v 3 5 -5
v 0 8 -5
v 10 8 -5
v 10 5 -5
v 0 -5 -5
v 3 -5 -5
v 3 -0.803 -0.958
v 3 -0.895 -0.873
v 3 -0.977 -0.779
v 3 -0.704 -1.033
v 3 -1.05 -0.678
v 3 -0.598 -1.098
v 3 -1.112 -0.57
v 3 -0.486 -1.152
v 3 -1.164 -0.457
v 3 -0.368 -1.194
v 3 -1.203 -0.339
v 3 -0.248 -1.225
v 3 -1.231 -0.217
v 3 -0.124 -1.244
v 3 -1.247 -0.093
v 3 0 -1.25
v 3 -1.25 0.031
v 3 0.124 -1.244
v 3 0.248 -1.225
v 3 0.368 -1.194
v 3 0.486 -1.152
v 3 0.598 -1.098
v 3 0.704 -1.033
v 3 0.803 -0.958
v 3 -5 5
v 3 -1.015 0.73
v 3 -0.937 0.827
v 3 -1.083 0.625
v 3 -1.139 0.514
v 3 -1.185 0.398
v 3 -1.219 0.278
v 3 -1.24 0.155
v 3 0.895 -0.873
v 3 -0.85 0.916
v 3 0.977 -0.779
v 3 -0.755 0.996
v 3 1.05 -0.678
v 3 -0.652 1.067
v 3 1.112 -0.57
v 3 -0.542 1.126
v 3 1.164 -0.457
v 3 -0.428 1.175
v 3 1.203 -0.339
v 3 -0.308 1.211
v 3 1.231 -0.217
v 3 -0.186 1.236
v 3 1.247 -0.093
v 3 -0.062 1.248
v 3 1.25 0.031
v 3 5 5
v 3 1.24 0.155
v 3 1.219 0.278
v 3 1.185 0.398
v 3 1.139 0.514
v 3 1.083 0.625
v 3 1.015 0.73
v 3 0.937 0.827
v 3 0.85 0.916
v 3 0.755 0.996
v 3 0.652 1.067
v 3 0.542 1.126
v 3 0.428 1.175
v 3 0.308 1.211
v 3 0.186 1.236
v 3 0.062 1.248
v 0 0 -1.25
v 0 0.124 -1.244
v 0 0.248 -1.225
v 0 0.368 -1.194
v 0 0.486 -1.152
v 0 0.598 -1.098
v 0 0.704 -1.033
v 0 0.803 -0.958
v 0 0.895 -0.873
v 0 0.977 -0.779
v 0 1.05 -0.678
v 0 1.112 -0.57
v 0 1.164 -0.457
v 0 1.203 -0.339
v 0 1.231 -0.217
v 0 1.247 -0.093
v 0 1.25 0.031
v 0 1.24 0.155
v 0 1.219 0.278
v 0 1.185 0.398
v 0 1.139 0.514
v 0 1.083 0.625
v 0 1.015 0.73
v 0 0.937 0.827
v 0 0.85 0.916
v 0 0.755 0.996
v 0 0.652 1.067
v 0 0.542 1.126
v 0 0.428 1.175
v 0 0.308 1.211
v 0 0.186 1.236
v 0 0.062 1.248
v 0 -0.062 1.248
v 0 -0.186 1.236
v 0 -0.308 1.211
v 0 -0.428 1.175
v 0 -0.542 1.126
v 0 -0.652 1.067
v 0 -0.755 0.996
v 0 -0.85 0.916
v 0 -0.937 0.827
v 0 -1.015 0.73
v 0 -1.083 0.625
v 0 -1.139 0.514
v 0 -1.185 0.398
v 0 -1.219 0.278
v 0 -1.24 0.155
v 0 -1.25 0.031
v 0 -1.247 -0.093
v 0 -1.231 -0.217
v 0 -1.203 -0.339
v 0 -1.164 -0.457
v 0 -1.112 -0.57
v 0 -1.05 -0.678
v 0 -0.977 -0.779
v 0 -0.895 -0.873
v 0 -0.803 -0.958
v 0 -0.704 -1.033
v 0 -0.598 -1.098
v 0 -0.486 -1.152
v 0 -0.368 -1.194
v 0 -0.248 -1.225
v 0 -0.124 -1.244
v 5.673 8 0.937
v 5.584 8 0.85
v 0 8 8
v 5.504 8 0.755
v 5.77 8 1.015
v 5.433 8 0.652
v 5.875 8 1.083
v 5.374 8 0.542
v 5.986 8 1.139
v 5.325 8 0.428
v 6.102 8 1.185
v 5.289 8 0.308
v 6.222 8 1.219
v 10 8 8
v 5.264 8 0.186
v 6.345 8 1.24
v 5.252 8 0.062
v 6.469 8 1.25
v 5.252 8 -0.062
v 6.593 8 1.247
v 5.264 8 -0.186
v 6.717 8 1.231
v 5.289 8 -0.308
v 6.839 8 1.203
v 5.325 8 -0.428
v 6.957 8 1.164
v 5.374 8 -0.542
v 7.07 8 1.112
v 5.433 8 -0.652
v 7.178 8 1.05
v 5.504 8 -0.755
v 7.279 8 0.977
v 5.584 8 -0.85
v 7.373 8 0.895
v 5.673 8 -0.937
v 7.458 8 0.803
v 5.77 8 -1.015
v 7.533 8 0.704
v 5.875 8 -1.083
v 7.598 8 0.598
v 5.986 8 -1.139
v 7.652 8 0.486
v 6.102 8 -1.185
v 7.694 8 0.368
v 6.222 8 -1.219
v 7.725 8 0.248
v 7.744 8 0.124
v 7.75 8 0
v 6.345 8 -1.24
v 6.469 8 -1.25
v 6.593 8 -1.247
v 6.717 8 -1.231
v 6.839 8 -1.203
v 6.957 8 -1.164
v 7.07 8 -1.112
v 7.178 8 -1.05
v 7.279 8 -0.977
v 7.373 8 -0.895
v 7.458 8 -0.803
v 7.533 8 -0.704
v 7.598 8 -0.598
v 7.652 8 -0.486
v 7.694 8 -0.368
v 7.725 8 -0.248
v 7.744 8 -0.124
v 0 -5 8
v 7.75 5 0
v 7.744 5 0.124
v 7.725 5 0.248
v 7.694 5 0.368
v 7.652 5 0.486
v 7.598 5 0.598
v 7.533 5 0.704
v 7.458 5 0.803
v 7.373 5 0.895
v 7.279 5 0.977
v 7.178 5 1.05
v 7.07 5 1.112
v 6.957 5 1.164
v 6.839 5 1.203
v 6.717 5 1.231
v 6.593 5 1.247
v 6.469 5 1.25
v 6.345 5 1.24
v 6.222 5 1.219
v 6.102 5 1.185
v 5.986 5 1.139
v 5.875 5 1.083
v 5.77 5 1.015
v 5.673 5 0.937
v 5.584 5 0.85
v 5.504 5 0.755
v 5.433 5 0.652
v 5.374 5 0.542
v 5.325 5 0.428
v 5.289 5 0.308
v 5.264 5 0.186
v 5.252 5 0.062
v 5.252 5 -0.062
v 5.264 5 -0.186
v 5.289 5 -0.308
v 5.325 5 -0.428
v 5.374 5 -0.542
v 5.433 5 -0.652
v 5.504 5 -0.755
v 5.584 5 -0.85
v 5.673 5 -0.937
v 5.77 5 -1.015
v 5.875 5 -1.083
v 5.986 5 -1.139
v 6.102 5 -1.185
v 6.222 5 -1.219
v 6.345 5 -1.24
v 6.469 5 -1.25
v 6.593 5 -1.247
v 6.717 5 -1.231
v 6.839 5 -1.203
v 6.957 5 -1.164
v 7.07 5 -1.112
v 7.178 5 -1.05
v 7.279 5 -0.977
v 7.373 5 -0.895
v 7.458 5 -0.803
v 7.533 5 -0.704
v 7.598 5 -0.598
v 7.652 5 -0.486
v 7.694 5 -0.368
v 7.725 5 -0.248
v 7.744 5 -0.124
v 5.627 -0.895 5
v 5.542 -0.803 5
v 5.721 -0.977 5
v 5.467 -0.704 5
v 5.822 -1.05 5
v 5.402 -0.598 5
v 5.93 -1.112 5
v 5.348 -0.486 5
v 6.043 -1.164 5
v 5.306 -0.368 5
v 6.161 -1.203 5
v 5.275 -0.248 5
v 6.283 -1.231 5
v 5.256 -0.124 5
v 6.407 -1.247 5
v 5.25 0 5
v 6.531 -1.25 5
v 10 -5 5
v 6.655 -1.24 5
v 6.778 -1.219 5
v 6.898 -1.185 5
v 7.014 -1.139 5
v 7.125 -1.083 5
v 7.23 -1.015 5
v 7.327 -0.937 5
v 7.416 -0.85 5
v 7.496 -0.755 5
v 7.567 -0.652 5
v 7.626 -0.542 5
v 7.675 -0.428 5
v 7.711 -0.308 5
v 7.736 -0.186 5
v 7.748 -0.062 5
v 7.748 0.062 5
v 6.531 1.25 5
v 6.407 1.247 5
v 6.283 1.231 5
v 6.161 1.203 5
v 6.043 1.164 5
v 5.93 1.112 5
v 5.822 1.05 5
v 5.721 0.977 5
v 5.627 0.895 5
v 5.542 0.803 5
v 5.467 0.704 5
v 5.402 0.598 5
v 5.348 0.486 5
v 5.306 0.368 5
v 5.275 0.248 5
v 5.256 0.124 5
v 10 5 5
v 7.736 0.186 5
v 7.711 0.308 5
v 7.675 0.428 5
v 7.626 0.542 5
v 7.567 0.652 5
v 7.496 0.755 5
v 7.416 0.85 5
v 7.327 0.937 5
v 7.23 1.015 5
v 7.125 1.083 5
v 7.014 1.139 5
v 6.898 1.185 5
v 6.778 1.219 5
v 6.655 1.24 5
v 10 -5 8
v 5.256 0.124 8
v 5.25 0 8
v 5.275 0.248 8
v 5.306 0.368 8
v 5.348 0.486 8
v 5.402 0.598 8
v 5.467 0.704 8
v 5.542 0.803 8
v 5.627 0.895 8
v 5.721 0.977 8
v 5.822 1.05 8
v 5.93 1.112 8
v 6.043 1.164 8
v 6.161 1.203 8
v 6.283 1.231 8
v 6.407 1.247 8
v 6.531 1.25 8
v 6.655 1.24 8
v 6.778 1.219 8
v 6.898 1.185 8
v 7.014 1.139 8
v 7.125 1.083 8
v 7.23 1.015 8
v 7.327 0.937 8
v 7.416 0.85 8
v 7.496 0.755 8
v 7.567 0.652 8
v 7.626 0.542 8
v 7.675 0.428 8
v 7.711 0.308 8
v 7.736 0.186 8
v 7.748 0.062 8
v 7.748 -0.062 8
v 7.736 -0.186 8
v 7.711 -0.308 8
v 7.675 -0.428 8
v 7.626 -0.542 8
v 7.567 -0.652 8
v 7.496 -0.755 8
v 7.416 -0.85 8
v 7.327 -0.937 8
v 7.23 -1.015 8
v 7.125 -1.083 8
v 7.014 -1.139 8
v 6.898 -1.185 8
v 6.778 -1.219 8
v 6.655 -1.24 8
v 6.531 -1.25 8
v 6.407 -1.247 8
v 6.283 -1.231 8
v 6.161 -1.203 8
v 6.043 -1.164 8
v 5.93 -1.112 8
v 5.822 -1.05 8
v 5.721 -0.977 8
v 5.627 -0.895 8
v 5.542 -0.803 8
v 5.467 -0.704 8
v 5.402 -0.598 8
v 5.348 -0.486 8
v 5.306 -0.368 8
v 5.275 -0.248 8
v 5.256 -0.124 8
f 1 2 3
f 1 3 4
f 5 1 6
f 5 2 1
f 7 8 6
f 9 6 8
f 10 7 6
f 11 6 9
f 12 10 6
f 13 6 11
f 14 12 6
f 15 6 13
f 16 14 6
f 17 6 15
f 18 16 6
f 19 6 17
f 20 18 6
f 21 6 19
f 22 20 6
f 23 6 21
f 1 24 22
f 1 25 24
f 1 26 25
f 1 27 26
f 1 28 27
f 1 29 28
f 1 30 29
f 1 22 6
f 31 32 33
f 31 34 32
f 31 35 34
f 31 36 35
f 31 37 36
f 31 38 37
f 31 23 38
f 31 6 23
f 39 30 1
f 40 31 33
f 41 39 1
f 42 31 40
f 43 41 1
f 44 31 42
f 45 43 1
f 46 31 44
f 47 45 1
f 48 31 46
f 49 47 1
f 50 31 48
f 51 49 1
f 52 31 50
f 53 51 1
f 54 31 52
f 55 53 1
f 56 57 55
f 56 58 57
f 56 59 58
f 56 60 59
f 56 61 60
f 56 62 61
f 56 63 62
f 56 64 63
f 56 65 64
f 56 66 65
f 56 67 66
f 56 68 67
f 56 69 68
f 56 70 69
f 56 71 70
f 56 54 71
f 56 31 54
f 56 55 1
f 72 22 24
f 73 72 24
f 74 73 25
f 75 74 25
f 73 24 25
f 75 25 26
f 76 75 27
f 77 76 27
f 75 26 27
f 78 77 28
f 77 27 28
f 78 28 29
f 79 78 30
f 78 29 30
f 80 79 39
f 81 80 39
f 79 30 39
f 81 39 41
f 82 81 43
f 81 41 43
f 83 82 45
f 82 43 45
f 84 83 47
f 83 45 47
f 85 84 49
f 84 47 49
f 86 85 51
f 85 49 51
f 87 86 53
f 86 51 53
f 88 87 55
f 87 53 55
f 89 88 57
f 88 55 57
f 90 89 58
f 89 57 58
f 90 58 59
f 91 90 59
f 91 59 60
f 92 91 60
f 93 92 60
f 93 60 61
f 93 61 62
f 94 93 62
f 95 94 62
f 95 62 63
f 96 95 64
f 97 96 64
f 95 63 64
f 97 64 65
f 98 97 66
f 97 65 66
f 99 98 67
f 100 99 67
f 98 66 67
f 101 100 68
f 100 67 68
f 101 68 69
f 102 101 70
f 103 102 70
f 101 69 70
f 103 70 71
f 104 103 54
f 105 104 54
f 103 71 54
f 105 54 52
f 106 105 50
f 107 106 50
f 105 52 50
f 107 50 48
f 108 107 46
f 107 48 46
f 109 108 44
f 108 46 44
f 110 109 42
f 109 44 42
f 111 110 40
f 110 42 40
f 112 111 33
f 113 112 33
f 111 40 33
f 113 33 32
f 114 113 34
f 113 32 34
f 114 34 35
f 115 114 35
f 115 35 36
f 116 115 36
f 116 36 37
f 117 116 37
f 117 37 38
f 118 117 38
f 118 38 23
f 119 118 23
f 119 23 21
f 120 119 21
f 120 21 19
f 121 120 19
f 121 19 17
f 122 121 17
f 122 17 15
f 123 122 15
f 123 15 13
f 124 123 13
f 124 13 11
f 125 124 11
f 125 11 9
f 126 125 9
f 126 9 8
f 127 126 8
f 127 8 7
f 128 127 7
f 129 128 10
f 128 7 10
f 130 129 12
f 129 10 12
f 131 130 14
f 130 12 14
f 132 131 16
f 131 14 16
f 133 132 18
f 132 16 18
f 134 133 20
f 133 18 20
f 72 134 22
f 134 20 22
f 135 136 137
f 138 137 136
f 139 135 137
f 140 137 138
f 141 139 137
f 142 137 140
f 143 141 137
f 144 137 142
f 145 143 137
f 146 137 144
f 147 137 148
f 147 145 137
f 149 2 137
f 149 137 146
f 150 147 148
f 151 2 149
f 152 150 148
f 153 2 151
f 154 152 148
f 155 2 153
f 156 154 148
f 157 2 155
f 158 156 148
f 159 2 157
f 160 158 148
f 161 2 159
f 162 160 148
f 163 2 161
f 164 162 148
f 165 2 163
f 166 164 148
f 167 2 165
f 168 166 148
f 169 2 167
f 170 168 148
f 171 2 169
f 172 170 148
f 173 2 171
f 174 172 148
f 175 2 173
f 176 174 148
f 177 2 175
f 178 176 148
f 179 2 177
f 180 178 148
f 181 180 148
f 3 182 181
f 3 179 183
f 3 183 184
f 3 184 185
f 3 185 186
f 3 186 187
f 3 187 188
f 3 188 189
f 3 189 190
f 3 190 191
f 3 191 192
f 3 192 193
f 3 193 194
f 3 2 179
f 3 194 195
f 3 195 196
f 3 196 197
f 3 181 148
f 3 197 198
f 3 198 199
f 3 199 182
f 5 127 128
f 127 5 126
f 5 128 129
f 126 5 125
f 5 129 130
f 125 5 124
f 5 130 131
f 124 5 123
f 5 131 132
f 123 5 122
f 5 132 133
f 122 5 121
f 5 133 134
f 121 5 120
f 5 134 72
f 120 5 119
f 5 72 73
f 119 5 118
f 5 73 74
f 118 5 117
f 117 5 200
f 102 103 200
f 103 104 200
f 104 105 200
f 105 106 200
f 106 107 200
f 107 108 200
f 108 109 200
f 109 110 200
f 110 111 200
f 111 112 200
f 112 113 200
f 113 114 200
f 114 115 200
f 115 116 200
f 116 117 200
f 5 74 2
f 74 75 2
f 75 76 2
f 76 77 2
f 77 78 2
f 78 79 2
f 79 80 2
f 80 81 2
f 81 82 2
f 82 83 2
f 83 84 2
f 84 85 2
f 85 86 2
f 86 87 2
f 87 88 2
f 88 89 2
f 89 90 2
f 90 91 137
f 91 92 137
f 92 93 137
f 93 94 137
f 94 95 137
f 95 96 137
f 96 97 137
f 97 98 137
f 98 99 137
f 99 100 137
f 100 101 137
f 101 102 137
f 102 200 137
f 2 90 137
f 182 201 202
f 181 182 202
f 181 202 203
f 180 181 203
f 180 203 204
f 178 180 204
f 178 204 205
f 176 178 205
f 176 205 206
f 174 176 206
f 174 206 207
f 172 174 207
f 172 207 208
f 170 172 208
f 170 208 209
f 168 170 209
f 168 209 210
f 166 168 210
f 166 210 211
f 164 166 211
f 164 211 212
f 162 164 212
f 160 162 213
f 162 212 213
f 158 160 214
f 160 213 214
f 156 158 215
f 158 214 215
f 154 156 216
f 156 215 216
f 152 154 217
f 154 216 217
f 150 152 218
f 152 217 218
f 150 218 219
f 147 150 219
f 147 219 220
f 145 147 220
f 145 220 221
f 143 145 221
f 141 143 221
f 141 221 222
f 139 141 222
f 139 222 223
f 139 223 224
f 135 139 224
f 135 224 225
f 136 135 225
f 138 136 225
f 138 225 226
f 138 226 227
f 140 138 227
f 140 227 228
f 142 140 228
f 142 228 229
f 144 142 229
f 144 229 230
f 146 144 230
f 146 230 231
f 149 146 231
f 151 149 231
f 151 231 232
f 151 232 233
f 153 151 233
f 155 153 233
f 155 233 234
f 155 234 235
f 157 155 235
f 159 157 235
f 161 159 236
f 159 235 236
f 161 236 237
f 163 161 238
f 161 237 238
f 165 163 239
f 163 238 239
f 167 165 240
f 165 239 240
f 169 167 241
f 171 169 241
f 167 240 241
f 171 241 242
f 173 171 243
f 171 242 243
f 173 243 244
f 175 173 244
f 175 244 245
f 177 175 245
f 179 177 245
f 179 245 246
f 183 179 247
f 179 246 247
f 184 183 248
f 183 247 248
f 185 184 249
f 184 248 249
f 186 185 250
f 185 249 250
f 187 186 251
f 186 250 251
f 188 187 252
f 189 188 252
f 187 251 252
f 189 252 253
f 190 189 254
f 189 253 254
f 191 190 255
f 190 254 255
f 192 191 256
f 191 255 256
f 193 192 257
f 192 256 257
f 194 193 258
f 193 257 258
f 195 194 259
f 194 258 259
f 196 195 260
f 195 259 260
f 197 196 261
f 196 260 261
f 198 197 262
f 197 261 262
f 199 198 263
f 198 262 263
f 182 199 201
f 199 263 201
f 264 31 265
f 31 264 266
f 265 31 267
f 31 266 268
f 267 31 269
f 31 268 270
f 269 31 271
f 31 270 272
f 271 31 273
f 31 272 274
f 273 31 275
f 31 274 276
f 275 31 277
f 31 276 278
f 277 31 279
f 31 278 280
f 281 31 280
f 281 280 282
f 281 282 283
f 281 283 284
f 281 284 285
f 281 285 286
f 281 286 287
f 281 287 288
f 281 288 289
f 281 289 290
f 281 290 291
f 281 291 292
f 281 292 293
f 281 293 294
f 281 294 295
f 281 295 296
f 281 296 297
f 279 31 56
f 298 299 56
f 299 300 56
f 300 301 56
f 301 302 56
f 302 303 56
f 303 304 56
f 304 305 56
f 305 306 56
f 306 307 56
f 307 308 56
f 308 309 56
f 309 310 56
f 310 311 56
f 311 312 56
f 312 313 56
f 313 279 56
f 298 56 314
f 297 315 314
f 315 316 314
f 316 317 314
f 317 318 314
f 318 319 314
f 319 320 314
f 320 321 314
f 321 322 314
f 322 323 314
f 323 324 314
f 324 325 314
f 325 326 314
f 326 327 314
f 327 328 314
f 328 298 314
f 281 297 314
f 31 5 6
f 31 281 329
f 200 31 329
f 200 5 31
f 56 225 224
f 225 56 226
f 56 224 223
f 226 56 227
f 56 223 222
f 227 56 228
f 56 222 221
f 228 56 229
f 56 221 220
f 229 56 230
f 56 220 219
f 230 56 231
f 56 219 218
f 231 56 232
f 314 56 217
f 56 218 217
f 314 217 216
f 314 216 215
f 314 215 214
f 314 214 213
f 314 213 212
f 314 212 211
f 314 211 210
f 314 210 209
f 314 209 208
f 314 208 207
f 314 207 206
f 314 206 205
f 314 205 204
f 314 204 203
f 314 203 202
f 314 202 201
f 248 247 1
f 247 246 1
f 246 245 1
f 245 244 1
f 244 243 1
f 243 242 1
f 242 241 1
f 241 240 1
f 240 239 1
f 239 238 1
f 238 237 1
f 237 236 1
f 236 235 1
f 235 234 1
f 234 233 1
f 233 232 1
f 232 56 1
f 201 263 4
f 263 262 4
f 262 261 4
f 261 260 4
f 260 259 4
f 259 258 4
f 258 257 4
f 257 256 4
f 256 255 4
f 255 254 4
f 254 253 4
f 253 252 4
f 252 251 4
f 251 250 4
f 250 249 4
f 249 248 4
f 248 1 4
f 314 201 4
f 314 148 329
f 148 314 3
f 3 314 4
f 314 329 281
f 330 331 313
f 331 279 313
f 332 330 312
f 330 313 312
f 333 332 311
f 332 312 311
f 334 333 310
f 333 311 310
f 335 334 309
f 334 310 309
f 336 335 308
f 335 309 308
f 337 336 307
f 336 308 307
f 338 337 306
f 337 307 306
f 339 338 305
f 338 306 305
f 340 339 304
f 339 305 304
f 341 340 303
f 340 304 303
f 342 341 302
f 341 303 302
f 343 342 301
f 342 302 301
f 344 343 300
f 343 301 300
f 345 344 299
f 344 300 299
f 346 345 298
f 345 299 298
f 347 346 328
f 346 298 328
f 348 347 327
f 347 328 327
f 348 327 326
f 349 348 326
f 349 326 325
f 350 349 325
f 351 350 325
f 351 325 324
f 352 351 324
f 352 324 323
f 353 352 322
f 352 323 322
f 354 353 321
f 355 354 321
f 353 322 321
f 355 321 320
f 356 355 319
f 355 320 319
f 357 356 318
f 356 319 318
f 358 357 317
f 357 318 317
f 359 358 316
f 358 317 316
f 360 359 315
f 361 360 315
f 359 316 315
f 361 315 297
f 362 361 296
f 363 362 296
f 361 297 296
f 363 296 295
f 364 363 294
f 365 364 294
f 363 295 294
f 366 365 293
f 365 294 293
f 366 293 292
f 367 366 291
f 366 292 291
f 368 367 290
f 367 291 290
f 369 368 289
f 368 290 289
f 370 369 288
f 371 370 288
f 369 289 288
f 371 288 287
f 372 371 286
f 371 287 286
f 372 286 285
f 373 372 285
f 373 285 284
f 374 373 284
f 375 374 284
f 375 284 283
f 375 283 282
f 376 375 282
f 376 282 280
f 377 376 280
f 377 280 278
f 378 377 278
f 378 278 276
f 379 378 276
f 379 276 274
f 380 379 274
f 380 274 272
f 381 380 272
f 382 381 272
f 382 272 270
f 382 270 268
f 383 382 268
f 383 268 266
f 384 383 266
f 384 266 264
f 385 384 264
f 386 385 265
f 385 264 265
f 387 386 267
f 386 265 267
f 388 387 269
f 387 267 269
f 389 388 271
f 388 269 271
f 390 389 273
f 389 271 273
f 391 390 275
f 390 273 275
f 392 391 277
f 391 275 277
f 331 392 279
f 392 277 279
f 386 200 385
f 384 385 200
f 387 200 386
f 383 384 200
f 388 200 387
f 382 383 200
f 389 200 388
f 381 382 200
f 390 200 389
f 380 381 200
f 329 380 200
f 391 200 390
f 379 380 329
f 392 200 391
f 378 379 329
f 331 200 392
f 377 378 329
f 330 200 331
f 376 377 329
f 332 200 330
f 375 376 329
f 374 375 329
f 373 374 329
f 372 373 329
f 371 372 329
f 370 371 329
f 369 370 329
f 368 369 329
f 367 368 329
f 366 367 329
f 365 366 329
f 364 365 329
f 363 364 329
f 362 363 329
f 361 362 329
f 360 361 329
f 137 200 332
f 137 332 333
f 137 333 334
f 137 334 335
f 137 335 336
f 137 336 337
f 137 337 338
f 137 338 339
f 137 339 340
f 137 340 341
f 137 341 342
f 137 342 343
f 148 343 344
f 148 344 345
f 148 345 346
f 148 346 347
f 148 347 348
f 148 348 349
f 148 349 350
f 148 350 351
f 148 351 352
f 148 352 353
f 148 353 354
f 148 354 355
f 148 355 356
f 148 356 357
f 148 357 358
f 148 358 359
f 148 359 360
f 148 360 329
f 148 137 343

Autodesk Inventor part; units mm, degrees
ref_plane "YZ Plane" through (0, 0, 0) normal (1, 0, 0) x (0, 1, 0)
ref_plane "XZ Plane" through (0, 0, 0) normal (0, 1, 0) x (-1, 0, 0)
ref_plane "XY Plane" through (0, 0, 0) normal (0, 0, 1) x (1, 0, 0)
sketch "스케치1" plane through (0, 0, 0) normal (1, 0, 0) x (0, 1, 0)
  line L0 (-5, 5) -> (5, 5)
  line L1 (5, 5) -> (5, -5)
  line L2 (5, -5) -> (-5, -5)
  line L3 (-5, -5) -> (-5, 5)
  line L4 (-5, 5) -> (5, -5) construction
  line L5 (5, 5) -> (-5, -5) construction
  point P0 (0, 0)
  dimension "d0" = 10
  dimension "d1" = 10
extrude "돌출1" add sketch "스케치1" along normal blind 3
sketch "스케치2" plane through (0, 5, 5) normal (0, 1, 0) x (1, 0, 0)
  line L0 (0, 10) -> (0, 0) projected
  line L1 (0, 0) -> (3, 0) projected
  line L2 (3, 10) -> (3, 0) projected
  line L3 (0, 10) -> (3, 10) projected
  line L4 (0, 0) -> (10, 0)
  line L5 (10, 0) -> (10, 10)
  line L6 (10, 10) -> (0, 10)
  line L7 (0, 10) -> (0, 0)
  point P0 (0, 5)
  dimension "d4" = 10
  dimension "d5" = 10
extrude "돌출2" add sketch "스케치2" along normal blind 3
sketch "스케치3" plane through (0, -5, 5) normal (0, 0, 1) x (1, 0, 0)
  line L0 (0, 0) -> (0, 13) projected
  line L1 (0, 0) -> (3, 0) projected
  line L2 (3, 10) -> (3, 0) projected
  line L3 (3, 10) -> (10, 10) projected
  line L4 (10, 10) -> (10, 13) projected
  line L5 (0, 13) -> (10, 13) projected
  line L6 (0, 13) -> (10, 13)
  line L7 (10, 13) -> (10, 0)
  line L8 (10, 0) -> (0, 0)
  line L9 (0, 0) -> (0, 13)
  point P0 (0, 5)
extrude "돌출3" add sketch "스케치3" along normal blind 3
sketch "스케치4" plane through (3, 0, 0) normal (1, 0, 0) x (0, 0, -1)
  circle A0 centre (0, 0) radius 1.25
  dimension "d10" = 2.5
extrude "돌출4" cut sketch "스케치4" against normal blind 3
sketch "스케치5" plane through (0, 5, 5) normal (0, -1, 0) x (1, 0, 0)
  line L0 (3, -10) -> (3, 0) projected
  line L1 (10, -10) -> (3, -10) projected
  line L2 (10, 0) -> (10, -10) projected
  line L3 (3, 0) -> (10, 0) projected
  line L4 (10, 0) -> (10, -10) projected
  line L5 (10, -5) -> (6.5, -5)
  line L6 (6.5, -5) -> (6.5, -10)
  circle A0 centre (6.5, -5) radius 1.25
  point P0 (0, -5)
  dimension "d13" = 2.5
extrude "돌출5" cut sketch "스케치5" against normal blind 3 contours A0 L5 L6 | L6 L5 A0
sketch "스케치6" plane through (0, -5, 5) normal (0, 0, -1) x (-1, 0, 0)
  line L0 (-3, 10) -> (-10, 10) projected
  line L1 (-10, 0) -> (-10, 10) projected
  line L2 (-3, 0) -> (-10, 0) projected
  line L3 (-3, 10) -> (-3, 0) projected
  line L4 (-3, 0) -> (-10, 0) projected
  line L5 (-6.5, 0) -> (-6.5, 5)
  line L6 (-6.5, 5) -> (-3, 5)
  circle A0 centre (-6.5, 5) radius 1.25
  point P0 (0, 5)
  dimension "d16" = 2.5
extrude "돌출6" cut sketch "스케치6" against normal blind 3 contours A0 L5 L6 | L6 L5 A0
properties part number "64" material "LCP 플라스틱"
